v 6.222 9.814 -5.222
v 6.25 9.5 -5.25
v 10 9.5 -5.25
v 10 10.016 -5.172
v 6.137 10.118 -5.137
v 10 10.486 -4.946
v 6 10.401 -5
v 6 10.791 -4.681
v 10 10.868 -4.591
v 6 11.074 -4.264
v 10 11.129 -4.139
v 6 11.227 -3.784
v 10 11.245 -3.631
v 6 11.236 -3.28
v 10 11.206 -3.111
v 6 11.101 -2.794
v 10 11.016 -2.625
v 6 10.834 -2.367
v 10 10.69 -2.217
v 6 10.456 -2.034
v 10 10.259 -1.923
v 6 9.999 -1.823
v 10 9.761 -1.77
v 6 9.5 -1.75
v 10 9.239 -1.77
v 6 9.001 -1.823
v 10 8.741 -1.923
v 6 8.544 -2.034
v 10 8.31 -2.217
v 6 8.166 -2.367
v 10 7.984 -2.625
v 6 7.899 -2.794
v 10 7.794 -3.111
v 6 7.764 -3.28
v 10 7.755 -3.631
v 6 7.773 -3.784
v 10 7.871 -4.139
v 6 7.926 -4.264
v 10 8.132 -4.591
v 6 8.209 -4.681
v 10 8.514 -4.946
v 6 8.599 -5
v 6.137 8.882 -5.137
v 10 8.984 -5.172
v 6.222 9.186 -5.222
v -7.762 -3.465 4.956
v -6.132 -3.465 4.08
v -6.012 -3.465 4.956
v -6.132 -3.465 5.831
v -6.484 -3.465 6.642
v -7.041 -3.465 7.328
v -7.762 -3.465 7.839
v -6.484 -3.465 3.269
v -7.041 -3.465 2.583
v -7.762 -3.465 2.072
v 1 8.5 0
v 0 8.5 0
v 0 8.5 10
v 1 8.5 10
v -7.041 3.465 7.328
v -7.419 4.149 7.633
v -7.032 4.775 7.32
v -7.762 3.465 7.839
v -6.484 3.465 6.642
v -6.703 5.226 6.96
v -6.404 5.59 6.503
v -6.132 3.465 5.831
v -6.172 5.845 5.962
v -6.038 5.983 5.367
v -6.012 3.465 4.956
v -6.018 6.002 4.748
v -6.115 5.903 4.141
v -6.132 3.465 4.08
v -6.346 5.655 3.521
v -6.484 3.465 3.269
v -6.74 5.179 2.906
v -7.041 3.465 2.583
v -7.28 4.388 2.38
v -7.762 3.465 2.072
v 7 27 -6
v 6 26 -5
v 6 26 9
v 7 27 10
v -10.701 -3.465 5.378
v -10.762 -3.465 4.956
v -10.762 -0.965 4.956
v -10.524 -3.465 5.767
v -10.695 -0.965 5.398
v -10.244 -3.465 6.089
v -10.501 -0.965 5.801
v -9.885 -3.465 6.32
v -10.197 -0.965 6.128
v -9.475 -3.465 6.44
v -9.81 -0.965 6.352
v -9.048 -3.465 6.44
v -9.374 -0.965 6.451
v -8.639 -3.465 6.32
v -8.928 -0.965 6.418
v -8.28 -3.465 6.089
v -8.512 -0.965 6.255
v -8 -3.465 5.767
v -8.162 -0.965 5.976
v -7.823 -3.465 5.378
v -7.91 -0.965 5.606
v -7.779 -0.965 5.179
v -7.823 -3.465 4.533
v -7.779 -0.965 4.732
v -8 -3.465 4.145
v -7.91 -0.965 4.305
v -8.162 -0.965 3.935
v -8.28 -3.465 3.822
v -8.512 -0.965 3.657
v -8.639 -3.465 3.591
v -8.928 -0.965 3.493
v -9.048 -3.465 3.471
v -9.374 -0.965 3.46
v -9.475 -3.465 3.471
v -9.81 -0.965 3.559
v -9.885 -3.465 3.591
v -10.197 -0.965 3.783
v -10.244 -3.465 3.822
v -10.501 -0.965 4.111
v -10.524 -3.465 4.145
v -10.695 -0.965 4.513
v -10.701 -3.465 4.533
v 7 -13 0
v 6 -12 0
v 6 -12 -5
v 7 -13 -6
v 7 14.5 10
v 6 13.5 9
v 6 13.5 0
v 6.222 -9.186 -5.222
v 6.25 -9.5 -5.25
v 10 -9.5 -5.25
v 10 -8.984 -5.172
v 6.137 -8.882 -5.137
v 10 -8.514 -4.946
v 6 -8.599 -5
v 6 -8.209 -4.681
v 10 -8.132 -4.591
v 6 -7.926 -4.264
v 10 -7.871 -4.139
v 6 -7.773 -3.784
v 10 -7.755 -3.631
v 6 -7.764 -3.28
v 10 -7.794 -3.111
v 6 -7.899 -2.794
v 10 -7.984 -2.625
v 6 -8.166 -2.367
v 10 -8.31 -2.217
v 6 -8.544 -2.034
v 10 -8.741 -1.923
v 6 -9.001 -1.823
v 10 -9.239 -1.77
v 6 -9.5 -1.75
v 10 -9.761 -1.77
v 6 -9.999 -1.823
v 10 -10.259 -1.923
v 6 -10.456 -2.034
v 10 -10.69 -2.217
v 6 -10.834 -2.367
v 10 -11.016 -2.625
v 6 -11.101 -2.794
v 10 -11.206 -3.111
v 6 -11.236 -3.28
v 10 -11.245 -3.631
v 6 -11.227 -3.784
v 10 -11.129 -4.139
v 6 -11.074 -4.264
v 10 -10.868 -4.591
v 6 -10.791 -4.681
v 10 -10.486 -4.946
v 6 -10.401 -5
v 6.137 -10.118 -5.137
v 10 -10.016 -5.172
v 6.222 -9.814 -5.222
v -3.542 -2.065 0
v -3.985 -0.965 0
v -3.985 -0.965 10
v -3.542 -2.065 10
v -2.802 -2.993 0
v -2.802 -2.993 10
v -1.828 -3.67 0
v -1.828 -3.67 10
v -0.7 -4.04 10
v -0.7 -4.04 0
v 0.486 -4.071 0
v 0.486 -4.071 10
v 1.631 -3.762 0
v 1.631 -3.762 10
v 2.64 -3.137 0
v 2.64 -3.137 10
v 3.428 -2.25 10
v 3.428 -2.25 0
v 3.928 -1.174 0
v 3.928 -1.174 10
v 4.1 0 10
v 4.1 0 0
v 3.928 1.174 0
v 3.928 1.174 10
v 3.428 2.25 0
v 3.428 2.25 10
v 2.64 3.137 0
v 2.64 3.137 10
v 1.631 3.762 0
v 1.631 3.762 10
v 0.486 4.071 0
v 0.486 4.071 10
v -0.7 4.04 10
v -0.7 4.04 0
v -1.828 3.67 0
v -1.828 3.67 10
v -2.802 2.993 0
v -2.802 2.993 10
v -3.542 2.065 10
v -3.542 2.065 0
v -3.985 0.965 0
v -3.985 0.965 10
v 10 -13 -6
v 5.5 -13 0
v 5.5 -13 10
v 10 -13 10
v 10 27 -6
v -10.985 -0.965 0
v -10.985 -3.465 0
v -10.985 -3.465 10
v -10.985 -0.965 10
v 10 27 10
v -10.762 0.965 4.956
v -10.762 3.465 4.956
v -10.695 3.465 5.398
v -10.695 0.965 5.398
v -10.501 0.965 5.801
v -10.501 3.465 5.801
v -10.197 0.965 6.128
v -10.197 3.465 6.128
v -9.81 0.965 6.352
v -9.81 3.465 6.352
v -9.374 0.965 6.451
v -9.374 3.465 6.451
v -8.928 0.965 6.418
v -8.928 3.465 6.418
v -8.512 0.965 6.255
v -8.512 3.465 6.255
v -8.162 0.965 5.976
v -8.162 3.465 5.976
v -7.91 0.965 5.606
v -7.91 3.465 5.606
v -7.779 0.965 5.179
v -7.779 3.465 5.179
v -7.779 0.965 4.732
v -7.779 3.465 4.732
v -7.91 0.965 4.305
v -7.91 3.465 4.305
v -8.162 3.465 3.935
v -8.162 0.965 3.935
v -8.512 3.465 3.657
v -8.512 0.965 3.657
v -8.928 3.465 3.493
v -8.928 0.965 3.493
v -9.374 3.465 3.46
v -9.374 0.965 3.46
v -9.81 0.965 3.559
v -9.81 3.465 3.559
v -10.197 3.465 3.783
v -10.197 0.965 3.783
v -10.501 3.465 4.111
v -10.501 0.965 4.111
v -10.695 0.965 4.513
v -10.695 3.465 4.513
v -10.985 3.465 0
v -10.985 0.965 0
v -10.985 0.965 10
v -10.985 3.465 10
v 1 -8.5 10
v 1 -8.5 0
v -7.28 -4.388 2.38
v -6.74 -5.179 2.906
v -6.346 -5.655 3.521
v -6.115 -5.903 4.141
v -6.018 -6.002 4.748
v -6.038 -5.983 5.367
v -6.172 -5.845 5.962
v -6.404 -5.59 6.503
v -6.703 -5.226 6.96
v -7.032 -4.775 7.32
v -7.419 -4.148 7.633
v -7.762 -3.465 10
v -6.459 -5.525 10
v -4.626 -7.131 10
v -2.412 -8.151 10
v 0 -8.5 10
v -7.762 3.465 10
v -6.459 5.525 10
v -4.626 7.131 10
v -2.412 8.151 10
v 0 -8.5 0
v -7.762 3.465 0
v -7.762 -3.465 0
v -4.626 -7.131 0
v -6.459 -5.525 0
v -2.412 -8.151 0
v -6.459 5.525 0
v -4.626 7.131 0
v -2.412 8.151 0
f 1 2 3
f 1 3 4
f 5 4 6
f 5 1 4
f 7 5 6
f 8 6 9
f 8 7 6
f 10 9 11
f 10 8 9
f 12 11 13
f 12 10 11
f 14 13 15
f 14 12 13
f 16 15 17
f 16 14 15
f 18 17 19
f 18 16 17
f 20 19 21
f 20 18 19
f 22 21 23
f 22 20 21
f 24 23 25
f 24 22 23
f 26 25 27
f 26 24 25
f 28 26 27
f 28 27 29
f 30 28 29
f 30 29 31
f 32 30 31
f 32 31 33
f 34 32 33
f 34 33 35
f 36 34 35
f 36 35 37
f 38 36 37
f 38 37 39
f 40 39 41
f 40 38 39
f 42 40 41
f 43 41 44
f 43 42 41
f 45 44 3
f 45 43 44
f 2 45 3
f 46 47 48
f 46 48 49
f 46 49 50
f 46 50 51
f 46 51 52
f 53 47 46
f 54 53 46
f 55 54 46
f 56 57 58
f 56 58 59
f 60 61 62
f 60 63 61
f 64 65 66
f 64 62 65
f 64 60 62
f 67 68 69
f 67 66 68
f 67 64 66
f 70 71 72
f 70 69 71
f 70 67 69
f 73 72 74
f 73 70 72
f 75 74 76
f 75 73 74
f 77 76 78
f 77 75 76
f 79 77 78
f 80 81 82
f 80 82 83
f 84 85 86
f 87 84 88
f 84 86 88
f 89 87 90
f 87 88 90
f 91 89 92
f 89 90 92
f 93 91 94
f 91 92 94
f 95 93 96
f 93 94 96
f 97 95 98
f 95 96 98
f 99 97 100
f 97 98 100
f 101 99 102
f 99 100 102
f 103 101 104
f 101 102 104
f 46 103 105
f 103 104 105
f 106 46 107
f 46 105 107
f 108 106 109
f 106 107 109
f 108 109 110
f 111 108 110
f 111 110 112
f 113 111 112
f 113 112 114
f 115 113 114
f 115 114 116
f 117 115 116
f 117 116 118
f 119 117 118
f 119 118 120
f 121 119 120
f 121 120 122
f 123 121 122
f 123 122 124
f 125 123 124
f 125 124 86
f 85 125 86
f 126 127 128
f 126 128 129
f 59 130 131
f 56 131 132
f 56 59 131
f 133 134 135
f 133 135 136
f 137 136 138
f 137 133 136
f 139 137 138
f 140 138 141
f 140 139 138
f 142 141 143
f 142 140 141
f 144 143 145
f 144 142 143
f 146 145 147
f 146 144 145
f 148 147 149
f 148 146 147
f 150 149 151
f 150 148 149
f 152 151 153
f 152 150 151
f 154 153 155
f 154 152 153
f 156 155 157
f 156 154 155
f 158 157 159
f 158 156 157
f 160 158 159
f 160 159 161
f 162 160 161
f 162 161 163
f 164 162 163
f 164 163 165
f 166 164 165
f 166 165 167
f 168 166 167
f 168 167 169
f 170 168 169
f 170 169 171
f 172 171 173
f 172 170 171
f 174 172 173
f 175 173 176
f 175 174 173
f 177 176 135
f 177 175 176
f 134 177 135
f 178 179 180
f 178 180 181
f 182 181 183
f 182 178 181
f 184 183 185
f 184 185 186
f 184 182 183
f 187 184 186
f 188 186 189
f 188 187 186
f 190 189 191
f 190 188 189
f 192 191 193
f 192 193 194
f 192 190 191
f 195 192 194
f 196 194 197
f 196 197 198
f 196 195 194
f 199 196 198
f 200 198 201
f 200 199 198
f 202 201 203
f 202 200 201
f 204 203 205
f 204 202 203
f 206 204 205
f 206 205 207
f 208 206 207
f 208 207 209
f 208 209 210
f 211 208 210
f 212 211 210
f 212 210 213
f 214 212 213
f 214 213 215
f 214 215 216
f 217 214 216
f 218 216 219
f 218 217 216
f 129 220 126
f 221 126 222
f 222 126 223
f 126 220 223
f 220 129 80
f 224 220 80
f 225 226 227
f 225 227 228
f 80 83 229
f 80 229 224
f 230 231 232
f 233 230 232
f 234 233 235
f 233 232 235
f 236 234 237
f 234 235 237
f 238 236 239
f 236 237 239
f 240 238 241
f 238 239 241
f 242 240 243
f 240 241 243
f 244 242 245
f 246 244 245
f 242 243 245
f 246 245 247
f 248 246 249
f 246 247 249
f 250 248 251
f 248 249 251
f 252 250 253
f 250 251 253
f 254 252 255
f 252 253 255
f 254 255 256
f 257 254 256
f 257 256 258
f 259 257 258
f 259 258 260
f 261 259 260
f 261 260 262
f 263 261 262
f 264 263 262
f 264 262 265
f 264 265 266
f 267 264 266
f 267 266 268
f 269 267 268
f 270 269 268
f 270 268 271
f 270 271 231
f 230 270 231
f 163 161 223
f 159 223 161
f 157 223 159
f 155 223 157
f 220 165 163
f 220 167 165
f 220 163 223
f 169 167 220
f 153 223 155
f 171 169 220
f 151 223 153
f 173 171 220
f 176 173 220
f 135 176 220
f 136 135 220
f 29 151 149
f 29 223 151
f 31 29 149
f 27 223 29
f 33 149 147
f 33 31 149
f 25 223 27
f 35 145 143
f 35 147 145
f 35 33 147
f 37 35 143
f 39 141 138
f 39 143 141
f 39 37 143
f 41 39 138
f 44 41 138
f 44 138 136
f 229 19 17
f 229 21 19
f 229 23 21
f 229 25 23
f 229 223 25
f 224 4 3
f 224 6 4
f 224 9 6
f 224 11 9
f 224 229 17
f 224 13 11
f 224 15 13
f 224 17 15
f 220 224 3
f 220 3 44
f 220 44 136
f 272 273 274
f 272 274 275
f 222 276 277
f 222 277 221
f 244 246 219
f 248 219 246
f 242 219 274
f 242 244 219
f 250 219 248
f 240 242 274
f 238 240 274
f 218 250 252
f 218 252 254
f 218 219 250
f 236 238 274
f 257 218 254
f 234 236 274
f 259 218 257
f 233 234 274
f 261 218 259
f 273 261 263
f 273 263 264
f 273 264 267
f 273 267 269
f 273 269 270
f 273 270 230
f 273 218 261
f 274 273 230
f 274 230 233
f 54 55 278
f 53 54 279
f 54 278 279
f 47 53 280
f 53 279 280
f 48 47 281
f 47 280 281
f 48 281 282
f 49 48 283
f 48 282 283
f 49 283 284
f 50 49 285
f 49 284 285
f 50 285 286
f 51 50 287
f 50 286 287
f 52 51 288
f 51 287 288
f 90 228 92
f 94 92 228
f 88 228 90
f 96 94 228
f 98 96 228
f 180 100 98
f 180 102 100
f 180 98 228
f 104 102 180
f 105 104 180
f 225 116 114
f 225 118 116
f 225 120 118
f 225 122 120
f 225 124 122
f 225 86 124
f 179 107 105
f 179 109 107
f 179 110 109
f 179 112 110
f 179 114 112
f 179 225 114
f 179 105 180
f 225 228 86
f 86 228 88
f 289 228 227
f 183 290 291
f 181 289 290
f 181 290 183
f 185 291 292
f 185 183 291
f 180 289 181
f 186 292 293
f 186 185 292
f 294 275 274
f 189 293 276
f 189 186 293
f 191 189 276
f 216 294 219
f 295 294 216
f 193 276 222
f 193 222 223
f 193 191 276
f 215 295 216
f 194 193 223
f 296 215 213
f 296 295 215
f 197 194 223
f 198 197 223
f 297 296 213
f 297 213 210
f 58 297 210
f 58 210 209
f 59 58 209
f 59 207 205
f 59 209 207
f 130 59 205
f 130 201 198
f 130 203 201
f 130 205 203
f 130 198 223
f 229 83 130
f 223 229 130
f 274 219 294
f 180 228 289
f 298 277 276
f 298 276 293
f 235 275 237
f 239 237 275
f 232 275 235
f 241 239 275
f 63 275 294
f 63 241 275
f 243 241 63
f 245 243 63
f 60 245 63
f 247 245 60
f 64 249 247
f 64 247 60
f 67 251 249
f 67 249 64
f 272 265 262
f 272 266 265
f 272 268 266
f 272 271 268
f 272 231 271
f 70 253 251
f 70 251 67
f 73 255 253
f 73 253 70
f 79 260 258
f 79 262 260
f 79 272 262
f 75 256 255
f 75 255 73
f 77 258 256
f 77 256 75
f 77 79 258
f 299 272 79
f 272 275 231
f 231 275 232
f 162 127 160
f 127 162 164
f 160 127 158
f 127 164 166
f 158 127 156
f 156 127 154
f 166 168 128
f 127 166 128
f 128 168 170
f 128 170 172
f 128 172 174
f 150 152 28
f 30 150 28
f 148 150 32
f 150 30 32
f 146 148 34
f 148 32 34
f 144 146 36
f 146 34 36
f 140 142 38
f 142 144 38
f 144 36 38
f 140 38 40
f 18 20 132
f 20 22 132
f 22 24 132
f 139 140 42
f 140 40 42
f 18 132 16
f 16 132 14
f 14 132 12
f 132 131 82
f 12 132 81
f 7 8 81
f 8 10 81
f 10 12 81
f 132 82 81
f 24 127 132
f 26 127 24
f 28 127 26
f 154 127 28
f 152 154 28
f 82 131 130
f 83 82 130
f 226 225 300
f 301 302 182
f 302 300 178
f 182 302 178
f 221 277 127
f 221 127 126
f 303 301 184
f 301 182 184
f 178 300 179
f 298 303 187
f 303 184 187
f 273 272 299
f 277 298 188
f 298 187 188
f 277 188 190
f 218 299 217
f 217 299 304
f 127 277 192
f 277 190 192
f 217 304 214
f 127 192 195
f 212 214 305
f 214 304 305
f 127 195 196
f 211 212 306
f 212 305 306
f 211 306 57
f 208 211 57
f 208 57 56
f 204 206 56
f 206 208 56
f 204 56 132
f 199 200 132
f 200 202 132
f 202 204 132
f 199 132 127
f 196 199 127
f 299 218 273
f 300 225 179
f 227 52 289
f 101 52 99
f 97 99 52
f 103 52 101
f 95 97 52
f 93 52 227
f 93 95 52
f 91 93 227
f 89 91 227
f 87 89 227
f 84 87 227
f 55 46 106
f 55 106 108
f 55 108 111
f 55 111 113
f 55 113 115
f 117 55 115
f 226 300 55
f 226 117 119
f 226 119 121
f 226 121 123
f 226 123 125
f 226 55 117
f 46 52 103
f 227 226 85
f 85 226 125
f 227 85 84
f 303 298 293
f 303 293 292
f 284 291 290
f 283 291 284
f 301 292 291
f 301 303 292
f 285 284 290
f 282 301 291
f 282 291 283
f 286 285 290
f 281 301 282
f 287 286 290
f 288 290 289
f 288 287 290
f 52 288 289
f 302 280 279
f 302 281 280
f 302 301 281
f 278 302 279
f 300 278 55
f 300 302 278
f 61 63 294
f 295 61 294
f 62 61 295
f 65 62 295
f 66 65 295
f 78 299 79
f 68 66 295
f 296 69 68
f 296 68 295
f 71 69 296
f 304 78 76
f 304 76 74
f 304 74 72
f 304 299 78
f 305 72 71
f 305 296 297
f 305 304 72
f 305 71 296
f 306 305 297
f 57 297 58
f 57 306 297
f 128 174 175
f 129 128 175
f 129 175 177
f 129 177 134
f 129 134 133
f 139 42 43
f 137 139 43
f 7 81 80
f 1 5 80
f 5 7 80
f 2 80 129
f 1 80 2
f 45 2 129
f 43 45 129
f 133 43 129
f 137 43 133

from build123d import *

# Parameters (mm, degrees)
RESSALTO_EXTRUS_O1_DEPTH = 10
ESBO_O2_R                = 3.25
CORTE_EXTRUS_O1_DEPTH    = 10
ESBO_O3_R                = 1.5
CORTE_EXTRUS_O2_DEPTH    = 10
CORTE_EXTRUS_O3_START    = 10
ESBO_O4_R                = 3.25
CORTE_EXTRUS_O3_DEPTH    = 10
ESBO_O5_W                = 16
ESBO_O5_H                = 40
ESBO_O5_R                = 1.75
RESSALTO_EXTRUS_O2_DEPTH = 4
CHANFRO1_SIZE            = 5
CHANFRO2_SIZE            = 5
CHANFRO3_SIZE            = 1


with BuildPart() as part:
    # Esboço1 → Ressalto-extrusão1 (new body)
    with BuildSketch(Plane.XY):
        with BuildLine():
            Line((0, 8.5), (8.5, 8.5))
            Line((8.5, 8.5), (8.5, 0))
            Line((8.5, 0), (8.5, -8.5))
            Line((8.5, -8.5), (0, -8.5))
            ThreePointArc((0, -8.5), (-4.626013402, -7.130918594), (-7.761817645, -3.464705882))
            Line((-7.761817645, -3.464705882), (-10.984889326, -3.464705686))
            Line((-10.984889326, -3.464705686), (-10.984889326, -0.964705686))
            Line((-10.984889326, -0.964705686), (-3.984889326, -0.964705686))
            ThreePointArc((-3.984889326, -0.964705686), (4.1, -1.01e-07), (-3.984889278, 0.964705882))
            Line((-3.984889278, 0.964705882), (-10.984889278, 0.964705882))
            Line((-10.984889278, 0.964705882), (-10.984889278, 3.464705882))
            Line((-10.984889278, 3.464705882), (-7.761817645, 3.464705882))
            ThreePointArc((-7.761817645, 3.464705882), (-4.626013402, 7.130918594), (0, 8.5))
        make_face()
    extrude(amount=RESSALTO_EXTRUS_O1_DEPTH)

    # Esboço2 → Corte-extrusão1 (cut)
    with BuildSketch(Plane(origin=(0, 3.464705882, 0), x_dir=(1, 0, 0), z_dir=(0, 1, 0))):
        with Locations((-9.261817645, -4.955566824)):
            Circle(ESBO_O2_R)
    extrude(amount=CORTE_EXTRUS_O1_DEPTH, mode=Mode.SUBTRACT)

    # Esboço3 → Corte-extrusão2 (cut)
    with BuildSketch(Plane(origin=(0, 3.464705882, 0), x_dir=(1, 0, 0), z_dir=(0, 1, 0))):
        with Locations(Location((-9.261817645, -4.955566824, 0), (0, 0, 180))):
            Circle(ESBO_O3_R)
    extrude(amount=-CORTE_EXTRUS_O2_DEPTH, mode=Mode.SUBTRACT)

    # Esboço4 → Corte-extrusão3 (cut)
    with BuildSketch(Plane(origin=(-2.11e-07, -3.464706354, 0), x_dir=(-0.9999999999999982, 6.08161782252128e-08, 0), z_dir=(-6.081617822521279e-08, -0.9999999999999981, 0)).offset(CORTE_EXTRUS_O3_START)):
        with Locations((9.261817434, -4.955566824)):
            Circle(ESBO_O4_R)
    extrude(amount=-CORTE_EXTRUS_O3_DEPTH, mode=Mode.SUBTRACT)

    # Esboço5 → Ressalto-extrusão2 (add)
    with BuildSketch(Plane(origin=(6, 0, 0), x_dir=(0, 0, -1), z_dir=(1, 0, 0))):
        with Locations((-2, 7)):
            Rectangle(ESBO_O5_W, ESBO_O5_H)
        with Locations((3.5, 9.5)):
            Circle(ESBO_O5_R, mode=Mode.SUBTRACT)
        with Locations((3.5, -9.5)):
            Circle(ESBO_O5_R, mode=Mode.SUBTRACT)
    extrude(amount=RESSALTO_EXTRUS_O2_DEPTH)

    # Chanfro1
    chanfro1_edges = [part.edges().sort_by_distance(p)[0] for p in [
        (6, 8.5, 5),
    ]]
    chamfer(chanfro1_edges, length=CHANFRO1_SIZE)

    # Chanfro2
    # the kernel refuses this chamfer: 5 mm, written as the material it adds along each edge
    with BuildSketch(Plane(origin=(6, -8.5, 10), x_dir=(-0.9996219169112968, 0.027495876610586317, 0), z_dir=(0, 0, -1))) as chanfro2_piece_1_section:
        Polygon((CHANFRO2_SIZE * 0.999621916911, -CHANFRO2_SIZE * 0.0274958766106), (-CHANFRO2_SIZE * 0.0274958766106, -CHANFRO2_SIZE * 0.999621916911), (0, 0), align=None)
    chanfro2_piece_1 = extrude(amount=10, mode=Mode.PRIVATE)
    chanfro2_piece_1 = split(chanfro2_piece_1, bisect_by=Plane(origin=(4.320496265, -13, 5), z_dir=(0, 1, 0)), keep=Keep.TOP, mode=Mode.PRIVATE)
    add(chanfro2_piece_1)

    # Chanfro3
    # the kernel refuses this chamfer: 1 mm, written as the material it takes off along each edge
    with BuildSketch(Plane(origin=(6, -13, -8.571682988), x_dir=(-0.02749587661058651, 0.9996219169112968, 0), z_dir=(0, 0, 1))) as chanfro3_piece_1:
        Polygon((CHANFRO3_SIZE * 0.999621916911, -CHANFRO3_SIZE * 0.0274958766106), (-CHANFRO3_SIZE * 0.0274958766106, -CHANFRO3_SIZE * 0.999621916911), (0, 0), align=None)
    extrude(amount=8.571682988, mode=Mode.SUBTRACT)
    with BuildSketch(Plane(origin=(6, 10.928317012, 10), x_dir=(-0.02749587661058651, 0, -0.9996219169112968), z_dir=(0, 1, 0))) as chanfro3_piece_2_section:
        Polygon((CHANFRO3_SIZE * 0.999621916911, -CHANFRO3_SIZE * 0.0274958766106), (-CHANFRO3_SIZE * 0.0274958766106, -CHANFRO3_SIZE * 0.999621916911), (0, 0), align=None)
    chanfro3_piece_2 = extrude(amount=18.643365976, mode=Mode.PRIVATE)
    chanfro3_piece_2 = split(chanfro3_piece_2, bisect_by=Plane(origin=(10.262240478, 17.762240478, 9.668049788), z_dir=(-0.7071067811865476, 0.7071067811865476, 0)), keep=Keep.TOP, mode=Mode.PRIVATE)
    add(chanfro3_piece_2, mode=Mode.SUBTRACT)
    with BuildSketch(Plane(origin=(6, 29.571682988, -6), x_dir=(-0.027495876610586487, 0, 0.9996219169112968), z_dir=(0, -1, 0))) as chanfro3_piece_3:
        Polygon((CHANFRO3_SIZE * 0.999621916911, -CHANFRO3_SIZE * 0.0274958766106), (-CHANFRO3_SIZE * 0.0274958766106, -CHANFRO3_SIZE * 0.999621916911), (0, 0), align=None)
    extrude(amount=45.143365976, mode=Mode.SUBTRACT)
    with BuildSketch(Plane(origin=(6, 27, 12.571682988), x_dir=(-0.02749587661058651, -0.9996219169112968, 0), z_dir=(0, 0, -1))) as chanfro3_piece_4:
        Polygon((CHANFRO3_SIZE * 0.999621916911, -CHANFRO3_SIZE * 0.0274958766106), (-CHANFRO3_SIZE * 0.0274958766106, -CHANFRO3_SIZE * 0.999621916911), (0, 0), align=None)
    extrude(amount=21.143365976, mode=Mode.SUBTRACT)


solid = part.part
